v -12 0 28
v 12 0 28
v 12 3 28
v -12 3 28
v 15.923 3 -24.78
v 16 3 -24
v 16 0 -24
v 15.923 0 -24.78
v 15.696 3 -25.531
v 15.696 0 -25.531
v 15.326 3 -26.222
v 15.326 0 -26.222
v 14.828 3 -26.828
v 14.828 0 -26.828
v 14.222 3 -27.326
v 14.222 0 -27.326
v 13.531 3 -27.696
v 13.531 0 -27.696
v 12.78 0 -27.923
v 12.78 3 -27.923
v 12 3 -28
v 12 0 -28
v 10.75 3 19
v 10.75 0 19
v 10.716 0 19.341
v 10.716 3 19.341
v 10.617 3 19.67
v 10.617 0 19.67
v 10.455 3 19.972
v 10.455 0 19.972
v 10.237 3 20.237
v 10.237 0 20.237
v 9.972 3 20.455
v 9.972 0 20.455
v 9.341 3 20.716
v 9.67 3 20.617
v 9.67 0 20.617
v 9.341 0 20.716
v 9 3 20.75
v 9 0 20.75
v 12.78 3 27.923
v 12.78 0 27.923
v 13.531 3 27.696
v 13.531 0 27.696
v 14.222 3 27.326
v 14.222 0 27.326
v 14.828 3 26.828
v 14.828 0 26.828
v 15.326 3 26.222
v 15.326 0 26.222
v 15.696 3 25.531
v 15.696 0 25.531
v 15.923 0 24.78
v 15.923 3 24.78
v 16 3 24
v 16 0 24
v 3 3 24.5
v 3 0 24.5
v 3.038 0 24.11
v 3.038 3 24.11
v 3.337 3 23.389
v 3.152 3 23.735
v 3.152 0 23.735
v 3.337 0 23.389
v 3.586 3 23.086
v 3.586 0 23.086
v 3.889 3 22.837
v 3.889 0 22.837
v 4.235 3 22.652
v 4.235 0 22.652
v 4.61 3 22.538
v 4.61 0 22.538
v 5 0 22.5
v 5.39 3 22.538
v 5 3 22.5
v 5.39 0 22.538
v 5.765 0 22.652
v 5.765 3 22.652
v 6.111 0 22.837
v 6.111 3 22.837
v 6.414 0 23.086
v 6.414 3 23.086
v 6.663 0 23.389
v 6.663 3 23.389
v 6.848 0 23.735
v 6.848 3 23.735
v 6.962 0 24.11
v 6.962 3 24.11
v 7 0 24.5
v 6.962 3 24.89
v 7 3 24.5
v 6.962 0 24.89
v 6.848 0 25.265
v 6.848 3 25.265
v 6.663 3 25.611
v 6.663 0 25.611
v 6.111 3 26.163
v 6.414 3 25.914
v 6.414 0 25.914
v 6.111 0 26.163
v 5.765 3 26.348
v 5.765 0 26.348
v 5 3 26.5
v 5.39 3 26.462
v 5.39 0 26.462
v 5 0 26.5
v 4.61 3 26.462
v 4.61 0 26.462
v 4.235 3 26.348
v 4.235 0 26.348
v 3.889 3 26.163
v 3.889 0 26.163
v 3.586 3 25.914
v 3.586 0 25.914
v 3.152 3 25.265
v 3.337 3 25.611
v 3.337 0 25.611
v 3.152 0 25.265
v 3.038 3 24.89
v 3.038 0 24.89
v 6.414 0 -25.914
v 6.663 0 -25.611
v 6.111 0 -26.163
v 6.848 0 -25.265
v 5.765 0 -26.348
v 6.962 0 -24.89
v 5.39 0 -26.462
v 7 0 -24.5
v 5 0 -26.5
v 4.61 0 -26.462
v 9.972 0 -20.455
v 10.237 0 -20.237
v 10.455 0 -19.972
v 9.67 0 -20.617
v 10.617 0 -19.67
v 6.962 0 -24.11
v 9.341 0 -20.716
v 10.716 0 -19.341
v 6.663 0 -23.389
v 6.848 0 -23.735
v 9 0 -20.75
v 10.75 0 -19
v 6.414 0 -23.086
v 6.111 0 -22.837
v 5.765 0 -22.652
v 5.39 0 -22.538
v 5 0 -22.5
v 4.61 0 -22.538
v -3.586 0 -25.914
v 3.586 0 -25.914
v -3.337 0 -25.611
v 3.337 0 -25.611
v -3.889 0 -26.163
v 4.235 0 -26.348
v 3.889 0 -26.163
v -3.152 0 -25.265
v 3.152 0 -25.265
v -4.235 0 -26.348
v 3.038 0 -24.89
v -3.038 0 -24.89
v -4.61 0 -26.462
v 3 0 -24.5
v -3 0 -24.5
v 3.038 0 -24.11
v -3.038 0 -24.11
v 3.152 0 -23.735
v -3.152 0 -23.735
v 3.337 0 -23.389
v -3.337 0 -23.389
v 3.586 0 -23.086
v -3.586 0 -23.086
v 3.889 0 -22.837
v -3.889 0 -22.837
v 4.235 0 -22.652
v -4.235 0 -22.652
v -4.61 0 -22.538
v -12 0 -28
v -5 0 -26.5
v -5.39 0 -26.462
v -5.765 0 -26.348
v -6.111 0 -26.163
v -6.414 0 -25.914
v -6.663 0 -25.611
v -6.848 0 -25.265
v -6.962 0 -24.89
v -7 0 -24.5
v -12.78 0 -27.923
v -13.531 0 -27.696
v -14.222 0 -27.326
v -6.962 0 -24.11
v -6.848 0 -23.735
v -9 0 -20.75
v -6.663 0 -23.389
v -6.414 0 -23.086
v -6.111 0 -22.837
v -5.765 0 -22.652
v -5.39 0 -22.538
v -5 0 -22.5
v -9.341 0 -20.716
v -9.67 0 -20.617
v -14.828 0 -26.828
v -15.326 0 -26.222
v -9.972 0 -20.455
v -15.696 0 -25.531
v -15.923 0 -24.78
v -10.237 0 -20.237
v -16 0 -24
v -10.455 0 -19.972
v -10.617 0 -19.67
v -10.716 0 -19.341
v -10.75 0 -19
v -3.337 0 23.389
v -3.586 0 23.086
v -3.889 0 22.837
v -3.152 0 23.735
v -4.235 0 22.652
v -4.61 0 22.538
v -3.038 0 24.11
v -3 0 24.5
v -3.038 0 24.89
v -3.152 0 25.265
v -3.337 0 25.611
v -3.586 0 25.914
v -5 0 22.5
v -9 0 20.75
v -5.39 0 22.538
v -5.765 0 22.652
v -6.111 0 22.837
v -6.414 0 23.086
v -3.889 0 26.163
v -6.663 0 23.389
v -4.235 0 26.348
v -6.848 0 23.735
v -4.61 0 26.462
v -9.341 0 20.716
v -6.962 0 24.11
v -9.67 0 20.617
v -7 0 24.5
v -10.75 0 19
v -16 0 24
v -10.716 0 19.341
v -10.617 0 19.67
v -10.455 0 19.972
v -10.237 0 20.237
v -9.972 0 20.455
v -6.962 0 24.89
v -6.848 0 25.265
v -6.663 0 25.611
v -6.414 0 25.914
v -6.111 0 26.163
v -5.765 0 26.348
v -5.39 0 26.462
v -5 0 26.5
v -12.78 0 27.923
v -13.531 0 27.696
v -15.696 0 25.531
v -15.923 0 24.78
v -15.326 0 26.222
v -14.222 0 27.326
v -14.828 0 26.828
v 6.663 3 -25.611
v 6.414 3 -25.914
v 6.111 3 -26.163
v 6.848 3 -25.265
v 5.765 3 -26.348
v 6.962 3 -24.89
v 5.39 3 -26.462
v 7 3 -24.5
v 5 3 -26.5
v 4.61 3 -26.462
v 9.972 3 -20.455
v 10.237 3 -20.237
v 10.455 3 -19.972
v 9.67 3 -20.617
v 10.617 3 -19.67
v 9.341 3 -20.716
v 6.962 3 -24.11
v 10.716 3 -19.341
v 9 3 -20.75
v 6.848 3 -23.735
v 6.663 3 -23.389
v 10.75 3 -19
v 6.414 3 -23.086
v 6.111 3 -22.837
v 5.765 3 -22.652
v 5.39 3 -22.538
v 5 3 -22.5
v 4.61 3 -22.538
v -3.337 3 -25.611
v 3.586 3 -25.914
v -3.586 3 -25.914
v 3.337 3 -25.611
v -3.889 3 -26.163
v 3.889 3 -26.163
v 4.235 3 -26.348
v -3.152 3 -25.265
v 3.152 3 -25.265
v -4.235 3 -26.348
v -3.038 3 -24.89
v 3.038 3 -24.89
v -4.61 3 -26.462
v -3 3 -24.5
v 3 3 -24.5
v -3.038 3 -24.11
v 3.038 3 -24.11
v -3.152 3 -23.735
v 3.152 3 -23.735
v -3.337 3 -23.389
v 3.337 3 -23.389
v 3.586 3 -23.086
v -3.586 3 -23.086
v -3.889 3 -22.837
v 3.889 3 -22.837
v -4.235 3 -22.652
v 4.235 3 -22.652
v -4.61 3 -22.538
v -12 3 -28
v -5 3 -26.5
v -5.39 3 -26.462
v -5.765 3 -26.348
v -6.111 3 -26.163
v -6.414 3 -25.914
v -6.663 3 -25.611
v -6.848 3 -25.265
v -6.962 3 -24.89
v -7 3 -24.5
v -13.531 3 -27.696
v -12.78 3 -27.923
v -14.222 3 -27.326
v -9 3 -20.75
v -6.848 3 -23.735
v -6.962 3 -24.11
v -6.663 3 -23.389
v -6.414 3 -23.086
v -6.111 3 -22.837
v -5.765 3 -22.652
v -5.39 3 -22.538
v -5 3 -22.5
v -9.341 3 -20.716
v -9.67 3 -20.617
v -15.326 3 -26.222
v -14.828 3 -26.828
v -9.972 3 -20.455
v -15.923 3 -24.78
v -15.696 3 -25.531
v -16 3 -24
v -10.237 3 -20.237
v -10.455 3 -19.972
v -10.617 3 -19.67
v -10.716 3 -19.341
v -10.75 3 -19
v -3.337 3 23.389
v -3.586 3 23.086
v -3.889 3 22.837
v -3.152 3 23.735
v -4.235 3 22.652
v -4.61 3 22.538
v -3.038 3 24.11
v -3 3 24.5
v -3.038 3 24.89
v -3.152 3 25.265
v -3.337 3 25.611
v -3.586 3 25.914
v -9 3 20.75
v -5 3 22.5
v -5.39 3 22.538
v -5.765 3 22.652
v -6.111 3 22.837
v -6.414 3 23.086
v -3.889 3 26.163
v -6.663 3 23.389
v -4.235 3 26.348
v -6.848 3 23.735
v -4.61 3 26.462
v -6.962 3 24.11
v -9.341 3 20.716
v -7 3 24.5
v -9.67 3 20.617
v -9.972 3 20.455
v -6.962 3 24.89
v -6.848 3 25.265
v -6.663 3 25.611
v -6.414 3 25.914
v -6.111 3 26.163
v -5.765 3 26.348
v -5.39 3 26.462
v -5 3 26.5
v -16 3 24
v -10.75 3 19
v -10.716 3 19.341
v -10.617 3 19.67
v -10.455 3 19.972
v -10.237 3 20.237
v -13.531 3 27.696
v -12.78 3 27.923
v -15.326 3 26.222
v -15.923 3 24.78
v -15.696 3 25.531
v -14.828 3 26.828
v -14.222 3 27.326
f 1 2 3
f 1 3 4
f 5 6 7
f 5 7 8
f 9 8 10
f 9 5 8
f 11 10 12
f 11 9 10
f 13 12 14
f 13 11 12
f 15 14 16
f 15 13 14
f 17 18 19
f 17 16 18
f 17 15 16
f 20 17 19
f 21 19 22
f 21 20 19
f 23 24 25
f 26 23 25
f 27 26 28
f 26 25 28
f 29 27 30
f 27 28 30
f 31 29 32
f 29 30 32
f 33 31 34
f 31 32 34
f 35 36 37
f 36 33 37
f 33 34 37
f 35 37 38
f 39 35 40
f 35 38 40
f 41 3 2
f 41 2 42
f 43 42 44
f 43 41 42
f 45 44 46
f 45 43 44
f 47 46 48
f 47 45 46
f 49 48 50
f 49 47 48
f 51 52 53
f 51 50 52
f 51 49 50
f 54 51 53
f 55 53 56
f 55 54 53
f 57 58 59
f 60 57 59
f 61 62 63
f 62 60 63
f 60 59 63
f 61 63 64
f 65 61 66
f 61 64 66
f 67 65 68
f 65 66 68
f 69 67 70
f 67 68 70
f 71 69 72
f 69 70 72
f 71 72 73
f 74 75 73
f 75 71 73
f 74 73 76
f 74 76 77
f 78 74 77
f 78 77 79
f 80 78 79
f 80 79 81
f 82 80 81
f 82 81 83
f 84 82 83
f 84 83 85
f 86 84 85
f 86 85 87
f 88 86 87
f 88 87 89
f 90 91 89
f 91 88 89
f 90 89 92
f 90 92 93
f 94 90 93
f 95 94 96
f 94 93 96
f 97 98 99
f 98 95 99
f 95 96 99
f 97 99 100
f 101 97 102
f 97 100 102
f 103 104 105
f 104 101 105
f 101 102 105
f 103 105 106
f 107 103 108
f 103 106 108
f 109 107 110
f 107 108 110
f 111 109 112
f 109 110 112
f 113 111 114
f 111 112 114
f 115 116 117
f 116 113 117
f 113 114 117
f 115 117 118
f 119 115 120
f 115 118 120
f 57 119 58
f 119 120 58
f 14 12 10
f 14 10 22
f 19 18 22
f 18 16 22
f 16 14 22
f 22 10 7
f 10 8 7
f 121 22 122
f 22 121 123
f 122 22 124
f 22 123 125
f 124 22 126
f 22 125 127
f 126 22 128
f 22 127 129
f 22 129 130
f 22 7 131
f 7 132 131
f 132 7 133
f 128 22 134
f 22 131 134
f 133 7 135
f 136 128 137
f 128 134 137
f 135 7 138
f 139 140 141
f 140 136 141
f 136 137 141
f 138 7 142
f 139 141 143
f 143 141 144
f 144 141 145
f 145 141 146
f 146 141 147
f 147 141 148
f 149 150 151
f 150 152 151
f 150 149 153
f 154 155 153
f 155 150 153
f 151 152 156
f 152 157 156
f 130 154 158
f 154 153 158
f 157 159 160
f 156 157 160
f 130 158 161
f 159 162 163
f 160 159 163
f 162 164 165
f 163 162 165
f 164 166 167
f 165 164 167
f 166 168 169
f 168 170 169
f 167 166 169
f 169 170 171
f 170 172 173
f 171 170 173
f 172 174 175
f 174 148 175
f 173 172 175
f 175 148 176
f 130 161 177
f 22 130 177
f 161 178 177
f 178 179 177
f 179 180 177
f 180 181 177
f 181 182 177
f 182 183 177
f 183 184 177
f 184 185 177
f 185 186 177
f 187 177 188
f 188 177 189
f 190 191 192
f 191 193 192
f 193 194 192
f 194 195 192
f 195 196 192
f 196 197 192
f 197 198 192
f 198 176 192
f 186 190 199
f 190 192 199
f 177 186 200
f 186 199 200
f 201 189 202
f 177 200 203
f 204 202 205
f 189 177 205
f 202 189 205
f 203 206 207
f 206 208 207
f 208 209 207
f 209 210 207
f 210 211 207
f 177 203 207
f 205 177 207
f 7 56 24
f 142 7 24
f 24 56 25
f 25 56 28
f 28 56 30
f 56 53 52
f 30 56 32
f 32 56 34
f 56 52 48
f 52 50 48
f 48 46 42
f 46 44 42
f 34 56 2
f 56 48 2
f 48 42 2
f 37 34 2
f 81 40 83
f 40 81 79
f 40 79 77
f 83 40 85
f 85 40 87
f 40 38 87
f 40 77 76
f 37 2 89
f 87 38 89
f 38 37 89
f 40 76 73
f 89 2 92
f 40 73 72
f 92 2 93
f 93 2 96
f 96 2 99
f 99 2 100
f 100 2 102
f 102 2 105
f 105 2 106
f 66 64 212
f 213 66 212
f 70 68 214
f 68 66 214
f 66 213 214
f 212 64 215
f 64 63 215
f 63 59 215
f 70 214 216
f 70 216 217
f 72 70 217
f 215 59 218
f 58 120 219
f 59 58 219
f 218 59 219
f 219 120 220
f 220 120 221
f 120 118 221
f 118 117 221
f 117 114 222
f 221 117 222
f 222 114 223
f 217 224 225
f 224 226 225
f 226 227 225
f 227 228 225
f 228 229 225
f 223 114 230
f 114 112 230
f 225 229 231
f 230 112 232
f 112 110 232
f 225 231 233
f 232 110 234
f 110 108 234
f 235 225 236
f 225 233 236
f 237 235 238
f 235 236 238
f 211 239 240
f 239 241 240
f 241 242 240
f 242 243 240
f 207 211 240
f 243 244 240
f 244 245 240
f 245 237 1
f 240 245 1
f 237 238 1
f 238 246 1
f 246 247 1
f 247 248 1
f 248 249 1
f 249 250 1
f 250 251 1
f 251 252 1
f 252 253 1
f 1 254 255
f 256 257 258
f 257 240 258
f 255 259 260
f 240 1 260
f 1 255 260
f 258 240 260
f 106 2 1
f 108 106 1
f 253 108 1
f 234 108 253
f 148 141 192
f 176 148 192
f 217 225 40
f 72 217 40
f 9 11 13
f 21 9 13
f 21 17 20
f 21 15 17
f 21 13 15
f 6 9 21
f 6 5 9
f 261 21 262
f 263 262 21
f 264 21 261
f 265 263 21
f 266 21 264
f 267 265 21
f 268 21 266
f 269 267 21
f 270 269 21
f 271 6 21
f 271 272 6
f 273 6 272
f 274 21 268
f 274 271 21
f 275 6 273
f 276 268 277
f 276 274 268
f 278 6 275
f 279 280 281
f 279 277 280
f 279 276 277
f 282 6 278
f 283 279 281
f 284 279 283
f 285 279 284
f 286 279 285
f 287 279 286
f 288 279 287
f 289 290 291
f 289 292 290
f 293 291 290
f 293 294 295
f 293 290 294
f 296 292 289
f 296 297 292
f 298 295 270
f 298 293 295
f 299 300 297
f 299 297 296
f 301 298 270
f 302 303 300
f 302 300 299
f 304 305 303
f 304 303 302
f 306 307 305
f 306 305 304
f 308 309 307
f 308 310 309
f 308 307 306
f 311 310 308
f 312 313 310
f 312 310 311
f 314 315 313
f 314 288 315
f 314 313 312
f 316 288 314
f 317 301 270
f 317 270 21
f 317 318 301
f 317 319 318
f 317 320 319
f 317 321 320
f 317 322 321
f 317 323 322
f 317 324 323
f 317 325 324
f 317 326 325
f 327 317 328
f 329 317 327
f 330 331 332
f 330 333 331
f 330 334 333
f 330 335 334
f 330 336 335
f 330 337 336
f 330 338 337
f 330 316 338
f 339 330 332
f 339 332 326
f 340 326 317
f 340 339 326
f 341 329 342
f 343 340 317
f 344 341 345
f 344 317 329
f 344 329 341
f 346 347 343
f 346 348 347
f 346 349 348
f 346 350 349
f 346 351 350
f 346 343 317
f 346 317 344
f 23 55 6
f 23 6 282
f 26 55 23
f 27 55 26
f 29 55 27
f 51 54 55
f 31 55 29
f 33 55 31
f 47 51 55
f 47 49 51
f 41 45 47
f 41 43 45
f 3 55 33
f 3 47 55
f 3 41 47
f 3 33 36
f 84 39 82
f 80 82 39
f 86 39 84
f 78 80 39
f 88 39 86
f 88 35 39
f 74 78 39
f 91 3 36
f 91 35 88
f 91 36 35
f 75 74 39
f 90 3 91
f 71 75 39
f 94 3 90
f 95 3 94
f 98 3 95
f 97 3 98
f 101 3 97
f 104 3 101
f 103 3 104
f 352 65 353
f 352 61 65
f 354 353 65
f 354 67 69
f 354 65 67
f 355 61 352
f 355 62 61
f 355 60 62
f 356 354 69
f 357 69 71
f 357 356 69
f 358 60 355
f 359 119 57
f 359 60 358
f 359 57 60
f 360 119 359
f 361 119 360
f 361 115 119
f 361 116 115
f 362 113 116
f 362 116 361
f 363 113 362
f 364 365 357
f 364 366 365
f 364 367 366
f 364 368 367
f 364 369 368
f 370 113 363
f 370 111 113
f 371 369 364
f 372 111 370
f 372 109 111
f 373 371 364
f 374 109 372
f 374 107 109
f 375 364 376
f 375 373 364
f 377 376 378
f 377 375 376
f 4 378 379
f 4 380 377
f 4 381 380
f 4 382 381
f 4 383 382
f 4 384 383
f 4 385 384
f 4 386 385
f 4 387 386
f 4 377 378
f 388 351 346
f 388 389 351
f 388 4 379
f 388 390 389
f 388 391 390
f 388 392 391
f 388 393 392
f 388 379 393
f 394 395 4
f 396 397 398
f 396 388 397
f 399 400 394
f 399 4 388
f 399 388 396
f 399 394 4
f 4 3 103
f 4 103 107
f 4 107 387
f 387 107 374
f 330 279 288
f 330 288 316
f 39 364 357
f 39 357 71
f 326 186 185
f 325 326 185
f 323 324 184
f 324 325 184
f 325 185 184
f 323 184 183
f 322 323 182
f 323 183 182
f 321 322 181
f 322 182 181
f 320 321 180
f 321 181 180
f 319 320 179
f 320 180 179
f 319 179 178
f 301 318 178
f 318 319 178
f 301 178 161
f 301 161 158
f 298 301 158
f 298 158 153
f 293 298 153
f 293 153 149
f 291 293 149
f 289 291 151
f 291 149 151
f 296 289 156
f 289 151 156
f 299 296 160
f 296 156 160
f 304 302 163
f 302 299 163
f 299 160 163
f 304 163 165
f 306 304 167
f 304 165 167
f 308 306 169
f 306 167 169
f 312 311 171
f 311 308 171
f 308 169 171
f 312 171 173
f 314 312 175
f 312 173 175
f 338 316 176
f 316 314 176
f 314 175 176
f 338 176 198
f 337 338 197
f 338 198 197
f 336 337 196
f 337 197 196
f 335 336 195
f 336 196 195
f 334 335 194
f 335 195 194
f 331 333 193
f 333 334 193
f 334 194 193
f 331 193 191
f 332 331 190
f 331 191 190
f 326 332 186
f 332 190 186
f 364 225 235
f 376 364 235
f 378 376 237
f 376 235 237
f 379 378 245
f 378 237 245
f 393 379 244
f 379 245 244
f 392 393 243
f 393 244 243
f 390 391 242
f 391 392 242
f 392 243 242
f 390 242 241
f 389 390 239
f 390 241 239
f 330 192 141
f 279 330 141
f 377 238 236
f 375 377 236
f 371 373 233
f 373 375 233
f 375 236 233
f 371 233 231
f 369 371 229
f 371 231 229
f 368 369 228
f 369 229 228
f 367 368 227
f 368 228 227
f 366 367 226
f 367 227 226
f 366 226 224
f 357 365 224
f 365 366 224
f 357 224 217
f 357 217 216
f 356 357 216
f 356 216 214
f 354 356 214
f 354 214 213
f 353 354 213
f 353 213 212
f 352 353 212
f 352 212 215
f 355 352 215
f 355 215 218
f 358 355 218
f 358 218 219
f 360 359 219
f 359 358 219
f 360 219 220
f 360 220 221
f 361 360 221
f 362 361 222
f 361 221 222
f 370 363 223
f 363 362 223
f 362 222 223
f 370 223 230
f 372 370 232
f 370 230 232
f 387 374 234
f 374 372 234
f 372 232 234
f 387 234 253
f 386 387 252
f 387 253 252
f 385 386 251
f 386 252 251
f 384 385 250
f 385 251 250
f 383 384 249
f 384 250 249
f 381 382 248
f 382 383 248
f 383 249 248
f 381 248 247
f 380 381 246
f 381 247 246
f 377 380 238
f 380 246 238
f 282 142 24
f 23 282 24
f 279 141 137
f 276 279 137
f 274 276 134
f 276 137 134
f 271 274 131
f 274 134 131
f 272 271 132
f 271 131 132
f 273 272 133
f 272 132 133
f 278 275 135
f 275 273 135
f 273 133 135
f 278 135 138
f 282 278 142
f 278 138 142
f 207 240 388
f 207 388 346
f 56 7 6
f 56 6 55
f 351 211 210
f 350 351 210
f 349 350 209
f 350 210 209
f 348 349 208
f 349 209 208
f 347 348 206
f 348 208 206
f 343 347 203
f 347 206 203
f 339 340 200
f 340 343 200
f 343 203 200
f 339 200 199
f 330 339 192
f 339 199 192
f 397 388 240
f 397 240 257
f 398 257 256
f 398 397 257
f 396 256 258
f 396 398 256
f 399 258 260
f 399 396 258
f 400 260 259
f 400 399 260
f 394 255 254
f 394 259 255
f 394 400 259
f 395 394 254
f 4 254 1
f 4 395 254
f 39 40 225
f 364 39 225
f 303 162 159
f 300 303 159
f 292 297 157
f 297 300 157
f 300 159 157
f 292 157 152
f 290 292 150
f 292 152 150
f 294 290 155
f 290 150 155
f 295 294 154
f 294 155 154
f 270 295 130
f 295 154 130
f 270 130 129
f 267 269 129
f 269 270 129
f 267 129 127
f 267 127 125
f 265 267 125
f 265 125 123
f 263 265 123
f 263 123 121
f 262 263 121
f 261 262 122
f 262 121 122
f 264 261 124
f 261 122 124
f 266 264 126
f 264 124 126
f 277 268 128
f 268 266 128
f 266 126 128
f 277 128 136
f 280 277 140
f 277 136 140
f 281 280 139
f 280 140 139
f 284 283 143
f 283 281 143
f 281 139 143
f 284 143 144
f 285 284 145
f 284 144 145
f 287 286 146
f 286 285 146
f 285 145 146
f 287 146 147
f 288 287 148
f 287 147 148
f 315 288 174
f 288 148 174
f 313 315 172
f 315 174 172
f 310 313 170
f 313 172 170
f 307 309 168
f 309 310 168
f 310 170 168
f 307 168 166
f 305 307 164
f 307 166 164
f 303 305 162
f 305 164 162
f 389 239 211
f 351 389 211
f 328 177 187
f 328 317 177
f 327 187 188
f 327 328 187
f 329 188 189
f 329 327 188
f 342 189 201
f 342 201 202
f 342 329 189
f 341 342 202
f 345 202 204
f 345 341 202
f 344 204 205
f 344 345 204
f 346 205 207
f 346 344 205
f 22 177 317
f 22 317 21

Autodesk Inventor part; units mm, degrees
ref_plane "YZ Plane" through (0, 0, 0) normal (1, 0, 0) x (0, 1, 0)
ref_plane "XZ Plane" through (0, 0, 0) normal (0, 1, 0) x (-1, 0, 0)
ref_plane "XY Plane" through (0, 0, 0) normal (0, 0, 1) x (1, 0, 0)
sketch "Sketch1" plane through (0, 0, 0) normal (0, 1, 0) x (-1, 0, 0)
  line L0 (9, 20.5) -> (-9, 20.5) construction
  line L1 (-10.5, 19) -> (-10.5, -19) construction
  line L2 (-9, -20.5) -> (9, -20.5) construction
  line L3 (10.5, -19) -> (10.5, 19) construction
  line L4 (10.5, 20.5) -> (-10.5, -20.5) construction
  line L5 (-10.5, 20.5) -> (10.5, -20.5) construction
  circle A0 centre (-5, 24.5) radius 2
  line L6 (0, 0) -> (10.5, 0) construction
  line L7 (0, 0) -> (0, -20.5) construction
  circle A1 centre (5, 24.5) radius 2
  circle A2 centre (-5, -24.5) radius 2
  circle A3 centre (5, -24.5) radius 2
  arc A4 (9, -20.5) -> (10.5, -19) centre (9, -19) ccw
  arc A5 (-10.5, -19) -> (-9, -20.5) centre (-9, -19) ccw construction
  arc A6 (10.5, 19) -> (9, 20.5) centre (9, 19) ccw
  arc A7 (-9, 20.5) -> (-10.5, 19) centre (-9, 19) ccw construction
  line L8 (9, -20.75) -> (-9, -20.75)
  arc A8 (-10.75, -19) -> (-9, -20.75) centre (-9, -19) ccw
  line L9 (-10.75, -19) -> (-10.75, 19)
  arc A9 (-9, 20.75) -> (-10.75, 19) centre (-9, 19) ccw
  line L10 (-9, 20.75) -> (9, 20.75)
  arc A10 (10.75, 19) -> (9, 20.75) centre (9, 19) ccw
  line L11 (10.75, 19) -> (10.75, -19)
  arc A11 (9, -20.75) -> (10.75, -19) centre (9, -19) ccw
  line L12 (16, -28) -> (-16, -28)
  line L13 (-16, -28) -> (-16, 28)
  line L14 (-16, 28) -> (16, 28)
  line L15 (16, 28) -> (16, -28)
  line L16 (16, -28) -> (-16, 28) construction
  line L17 (-16, -28) -> (16, 28) construction
  line L18 (-12.5, -12) -> (-12.5, 12) construction
  point P0 (-12.5, 0)
  dimension "d0" = 21
  dimension "d1" = 41
  dimension "d2" = 4
  dimension "d3" = 5
  dimension "d4" = 24.5
  dimension "d5" = 1.5
  dimension "d6" = 0.25
  dimension "d7" = 32
  dimension "d8" = 56
  dimension "d12" = 24
  dimension "d13" = 3.5
  dimension "d16" = 0
extrude "Extrusion1" add sketch "Sketch1" along normal blind 3
fillet "Fillet1" radius 4 4 edges at (16, 1.5, 28) (-16, 1.5, 28) (16, 1.5, -28) (-16, 1.5, -28)
properties part number "ClawServoPlate" material "Aluminum 6061"
